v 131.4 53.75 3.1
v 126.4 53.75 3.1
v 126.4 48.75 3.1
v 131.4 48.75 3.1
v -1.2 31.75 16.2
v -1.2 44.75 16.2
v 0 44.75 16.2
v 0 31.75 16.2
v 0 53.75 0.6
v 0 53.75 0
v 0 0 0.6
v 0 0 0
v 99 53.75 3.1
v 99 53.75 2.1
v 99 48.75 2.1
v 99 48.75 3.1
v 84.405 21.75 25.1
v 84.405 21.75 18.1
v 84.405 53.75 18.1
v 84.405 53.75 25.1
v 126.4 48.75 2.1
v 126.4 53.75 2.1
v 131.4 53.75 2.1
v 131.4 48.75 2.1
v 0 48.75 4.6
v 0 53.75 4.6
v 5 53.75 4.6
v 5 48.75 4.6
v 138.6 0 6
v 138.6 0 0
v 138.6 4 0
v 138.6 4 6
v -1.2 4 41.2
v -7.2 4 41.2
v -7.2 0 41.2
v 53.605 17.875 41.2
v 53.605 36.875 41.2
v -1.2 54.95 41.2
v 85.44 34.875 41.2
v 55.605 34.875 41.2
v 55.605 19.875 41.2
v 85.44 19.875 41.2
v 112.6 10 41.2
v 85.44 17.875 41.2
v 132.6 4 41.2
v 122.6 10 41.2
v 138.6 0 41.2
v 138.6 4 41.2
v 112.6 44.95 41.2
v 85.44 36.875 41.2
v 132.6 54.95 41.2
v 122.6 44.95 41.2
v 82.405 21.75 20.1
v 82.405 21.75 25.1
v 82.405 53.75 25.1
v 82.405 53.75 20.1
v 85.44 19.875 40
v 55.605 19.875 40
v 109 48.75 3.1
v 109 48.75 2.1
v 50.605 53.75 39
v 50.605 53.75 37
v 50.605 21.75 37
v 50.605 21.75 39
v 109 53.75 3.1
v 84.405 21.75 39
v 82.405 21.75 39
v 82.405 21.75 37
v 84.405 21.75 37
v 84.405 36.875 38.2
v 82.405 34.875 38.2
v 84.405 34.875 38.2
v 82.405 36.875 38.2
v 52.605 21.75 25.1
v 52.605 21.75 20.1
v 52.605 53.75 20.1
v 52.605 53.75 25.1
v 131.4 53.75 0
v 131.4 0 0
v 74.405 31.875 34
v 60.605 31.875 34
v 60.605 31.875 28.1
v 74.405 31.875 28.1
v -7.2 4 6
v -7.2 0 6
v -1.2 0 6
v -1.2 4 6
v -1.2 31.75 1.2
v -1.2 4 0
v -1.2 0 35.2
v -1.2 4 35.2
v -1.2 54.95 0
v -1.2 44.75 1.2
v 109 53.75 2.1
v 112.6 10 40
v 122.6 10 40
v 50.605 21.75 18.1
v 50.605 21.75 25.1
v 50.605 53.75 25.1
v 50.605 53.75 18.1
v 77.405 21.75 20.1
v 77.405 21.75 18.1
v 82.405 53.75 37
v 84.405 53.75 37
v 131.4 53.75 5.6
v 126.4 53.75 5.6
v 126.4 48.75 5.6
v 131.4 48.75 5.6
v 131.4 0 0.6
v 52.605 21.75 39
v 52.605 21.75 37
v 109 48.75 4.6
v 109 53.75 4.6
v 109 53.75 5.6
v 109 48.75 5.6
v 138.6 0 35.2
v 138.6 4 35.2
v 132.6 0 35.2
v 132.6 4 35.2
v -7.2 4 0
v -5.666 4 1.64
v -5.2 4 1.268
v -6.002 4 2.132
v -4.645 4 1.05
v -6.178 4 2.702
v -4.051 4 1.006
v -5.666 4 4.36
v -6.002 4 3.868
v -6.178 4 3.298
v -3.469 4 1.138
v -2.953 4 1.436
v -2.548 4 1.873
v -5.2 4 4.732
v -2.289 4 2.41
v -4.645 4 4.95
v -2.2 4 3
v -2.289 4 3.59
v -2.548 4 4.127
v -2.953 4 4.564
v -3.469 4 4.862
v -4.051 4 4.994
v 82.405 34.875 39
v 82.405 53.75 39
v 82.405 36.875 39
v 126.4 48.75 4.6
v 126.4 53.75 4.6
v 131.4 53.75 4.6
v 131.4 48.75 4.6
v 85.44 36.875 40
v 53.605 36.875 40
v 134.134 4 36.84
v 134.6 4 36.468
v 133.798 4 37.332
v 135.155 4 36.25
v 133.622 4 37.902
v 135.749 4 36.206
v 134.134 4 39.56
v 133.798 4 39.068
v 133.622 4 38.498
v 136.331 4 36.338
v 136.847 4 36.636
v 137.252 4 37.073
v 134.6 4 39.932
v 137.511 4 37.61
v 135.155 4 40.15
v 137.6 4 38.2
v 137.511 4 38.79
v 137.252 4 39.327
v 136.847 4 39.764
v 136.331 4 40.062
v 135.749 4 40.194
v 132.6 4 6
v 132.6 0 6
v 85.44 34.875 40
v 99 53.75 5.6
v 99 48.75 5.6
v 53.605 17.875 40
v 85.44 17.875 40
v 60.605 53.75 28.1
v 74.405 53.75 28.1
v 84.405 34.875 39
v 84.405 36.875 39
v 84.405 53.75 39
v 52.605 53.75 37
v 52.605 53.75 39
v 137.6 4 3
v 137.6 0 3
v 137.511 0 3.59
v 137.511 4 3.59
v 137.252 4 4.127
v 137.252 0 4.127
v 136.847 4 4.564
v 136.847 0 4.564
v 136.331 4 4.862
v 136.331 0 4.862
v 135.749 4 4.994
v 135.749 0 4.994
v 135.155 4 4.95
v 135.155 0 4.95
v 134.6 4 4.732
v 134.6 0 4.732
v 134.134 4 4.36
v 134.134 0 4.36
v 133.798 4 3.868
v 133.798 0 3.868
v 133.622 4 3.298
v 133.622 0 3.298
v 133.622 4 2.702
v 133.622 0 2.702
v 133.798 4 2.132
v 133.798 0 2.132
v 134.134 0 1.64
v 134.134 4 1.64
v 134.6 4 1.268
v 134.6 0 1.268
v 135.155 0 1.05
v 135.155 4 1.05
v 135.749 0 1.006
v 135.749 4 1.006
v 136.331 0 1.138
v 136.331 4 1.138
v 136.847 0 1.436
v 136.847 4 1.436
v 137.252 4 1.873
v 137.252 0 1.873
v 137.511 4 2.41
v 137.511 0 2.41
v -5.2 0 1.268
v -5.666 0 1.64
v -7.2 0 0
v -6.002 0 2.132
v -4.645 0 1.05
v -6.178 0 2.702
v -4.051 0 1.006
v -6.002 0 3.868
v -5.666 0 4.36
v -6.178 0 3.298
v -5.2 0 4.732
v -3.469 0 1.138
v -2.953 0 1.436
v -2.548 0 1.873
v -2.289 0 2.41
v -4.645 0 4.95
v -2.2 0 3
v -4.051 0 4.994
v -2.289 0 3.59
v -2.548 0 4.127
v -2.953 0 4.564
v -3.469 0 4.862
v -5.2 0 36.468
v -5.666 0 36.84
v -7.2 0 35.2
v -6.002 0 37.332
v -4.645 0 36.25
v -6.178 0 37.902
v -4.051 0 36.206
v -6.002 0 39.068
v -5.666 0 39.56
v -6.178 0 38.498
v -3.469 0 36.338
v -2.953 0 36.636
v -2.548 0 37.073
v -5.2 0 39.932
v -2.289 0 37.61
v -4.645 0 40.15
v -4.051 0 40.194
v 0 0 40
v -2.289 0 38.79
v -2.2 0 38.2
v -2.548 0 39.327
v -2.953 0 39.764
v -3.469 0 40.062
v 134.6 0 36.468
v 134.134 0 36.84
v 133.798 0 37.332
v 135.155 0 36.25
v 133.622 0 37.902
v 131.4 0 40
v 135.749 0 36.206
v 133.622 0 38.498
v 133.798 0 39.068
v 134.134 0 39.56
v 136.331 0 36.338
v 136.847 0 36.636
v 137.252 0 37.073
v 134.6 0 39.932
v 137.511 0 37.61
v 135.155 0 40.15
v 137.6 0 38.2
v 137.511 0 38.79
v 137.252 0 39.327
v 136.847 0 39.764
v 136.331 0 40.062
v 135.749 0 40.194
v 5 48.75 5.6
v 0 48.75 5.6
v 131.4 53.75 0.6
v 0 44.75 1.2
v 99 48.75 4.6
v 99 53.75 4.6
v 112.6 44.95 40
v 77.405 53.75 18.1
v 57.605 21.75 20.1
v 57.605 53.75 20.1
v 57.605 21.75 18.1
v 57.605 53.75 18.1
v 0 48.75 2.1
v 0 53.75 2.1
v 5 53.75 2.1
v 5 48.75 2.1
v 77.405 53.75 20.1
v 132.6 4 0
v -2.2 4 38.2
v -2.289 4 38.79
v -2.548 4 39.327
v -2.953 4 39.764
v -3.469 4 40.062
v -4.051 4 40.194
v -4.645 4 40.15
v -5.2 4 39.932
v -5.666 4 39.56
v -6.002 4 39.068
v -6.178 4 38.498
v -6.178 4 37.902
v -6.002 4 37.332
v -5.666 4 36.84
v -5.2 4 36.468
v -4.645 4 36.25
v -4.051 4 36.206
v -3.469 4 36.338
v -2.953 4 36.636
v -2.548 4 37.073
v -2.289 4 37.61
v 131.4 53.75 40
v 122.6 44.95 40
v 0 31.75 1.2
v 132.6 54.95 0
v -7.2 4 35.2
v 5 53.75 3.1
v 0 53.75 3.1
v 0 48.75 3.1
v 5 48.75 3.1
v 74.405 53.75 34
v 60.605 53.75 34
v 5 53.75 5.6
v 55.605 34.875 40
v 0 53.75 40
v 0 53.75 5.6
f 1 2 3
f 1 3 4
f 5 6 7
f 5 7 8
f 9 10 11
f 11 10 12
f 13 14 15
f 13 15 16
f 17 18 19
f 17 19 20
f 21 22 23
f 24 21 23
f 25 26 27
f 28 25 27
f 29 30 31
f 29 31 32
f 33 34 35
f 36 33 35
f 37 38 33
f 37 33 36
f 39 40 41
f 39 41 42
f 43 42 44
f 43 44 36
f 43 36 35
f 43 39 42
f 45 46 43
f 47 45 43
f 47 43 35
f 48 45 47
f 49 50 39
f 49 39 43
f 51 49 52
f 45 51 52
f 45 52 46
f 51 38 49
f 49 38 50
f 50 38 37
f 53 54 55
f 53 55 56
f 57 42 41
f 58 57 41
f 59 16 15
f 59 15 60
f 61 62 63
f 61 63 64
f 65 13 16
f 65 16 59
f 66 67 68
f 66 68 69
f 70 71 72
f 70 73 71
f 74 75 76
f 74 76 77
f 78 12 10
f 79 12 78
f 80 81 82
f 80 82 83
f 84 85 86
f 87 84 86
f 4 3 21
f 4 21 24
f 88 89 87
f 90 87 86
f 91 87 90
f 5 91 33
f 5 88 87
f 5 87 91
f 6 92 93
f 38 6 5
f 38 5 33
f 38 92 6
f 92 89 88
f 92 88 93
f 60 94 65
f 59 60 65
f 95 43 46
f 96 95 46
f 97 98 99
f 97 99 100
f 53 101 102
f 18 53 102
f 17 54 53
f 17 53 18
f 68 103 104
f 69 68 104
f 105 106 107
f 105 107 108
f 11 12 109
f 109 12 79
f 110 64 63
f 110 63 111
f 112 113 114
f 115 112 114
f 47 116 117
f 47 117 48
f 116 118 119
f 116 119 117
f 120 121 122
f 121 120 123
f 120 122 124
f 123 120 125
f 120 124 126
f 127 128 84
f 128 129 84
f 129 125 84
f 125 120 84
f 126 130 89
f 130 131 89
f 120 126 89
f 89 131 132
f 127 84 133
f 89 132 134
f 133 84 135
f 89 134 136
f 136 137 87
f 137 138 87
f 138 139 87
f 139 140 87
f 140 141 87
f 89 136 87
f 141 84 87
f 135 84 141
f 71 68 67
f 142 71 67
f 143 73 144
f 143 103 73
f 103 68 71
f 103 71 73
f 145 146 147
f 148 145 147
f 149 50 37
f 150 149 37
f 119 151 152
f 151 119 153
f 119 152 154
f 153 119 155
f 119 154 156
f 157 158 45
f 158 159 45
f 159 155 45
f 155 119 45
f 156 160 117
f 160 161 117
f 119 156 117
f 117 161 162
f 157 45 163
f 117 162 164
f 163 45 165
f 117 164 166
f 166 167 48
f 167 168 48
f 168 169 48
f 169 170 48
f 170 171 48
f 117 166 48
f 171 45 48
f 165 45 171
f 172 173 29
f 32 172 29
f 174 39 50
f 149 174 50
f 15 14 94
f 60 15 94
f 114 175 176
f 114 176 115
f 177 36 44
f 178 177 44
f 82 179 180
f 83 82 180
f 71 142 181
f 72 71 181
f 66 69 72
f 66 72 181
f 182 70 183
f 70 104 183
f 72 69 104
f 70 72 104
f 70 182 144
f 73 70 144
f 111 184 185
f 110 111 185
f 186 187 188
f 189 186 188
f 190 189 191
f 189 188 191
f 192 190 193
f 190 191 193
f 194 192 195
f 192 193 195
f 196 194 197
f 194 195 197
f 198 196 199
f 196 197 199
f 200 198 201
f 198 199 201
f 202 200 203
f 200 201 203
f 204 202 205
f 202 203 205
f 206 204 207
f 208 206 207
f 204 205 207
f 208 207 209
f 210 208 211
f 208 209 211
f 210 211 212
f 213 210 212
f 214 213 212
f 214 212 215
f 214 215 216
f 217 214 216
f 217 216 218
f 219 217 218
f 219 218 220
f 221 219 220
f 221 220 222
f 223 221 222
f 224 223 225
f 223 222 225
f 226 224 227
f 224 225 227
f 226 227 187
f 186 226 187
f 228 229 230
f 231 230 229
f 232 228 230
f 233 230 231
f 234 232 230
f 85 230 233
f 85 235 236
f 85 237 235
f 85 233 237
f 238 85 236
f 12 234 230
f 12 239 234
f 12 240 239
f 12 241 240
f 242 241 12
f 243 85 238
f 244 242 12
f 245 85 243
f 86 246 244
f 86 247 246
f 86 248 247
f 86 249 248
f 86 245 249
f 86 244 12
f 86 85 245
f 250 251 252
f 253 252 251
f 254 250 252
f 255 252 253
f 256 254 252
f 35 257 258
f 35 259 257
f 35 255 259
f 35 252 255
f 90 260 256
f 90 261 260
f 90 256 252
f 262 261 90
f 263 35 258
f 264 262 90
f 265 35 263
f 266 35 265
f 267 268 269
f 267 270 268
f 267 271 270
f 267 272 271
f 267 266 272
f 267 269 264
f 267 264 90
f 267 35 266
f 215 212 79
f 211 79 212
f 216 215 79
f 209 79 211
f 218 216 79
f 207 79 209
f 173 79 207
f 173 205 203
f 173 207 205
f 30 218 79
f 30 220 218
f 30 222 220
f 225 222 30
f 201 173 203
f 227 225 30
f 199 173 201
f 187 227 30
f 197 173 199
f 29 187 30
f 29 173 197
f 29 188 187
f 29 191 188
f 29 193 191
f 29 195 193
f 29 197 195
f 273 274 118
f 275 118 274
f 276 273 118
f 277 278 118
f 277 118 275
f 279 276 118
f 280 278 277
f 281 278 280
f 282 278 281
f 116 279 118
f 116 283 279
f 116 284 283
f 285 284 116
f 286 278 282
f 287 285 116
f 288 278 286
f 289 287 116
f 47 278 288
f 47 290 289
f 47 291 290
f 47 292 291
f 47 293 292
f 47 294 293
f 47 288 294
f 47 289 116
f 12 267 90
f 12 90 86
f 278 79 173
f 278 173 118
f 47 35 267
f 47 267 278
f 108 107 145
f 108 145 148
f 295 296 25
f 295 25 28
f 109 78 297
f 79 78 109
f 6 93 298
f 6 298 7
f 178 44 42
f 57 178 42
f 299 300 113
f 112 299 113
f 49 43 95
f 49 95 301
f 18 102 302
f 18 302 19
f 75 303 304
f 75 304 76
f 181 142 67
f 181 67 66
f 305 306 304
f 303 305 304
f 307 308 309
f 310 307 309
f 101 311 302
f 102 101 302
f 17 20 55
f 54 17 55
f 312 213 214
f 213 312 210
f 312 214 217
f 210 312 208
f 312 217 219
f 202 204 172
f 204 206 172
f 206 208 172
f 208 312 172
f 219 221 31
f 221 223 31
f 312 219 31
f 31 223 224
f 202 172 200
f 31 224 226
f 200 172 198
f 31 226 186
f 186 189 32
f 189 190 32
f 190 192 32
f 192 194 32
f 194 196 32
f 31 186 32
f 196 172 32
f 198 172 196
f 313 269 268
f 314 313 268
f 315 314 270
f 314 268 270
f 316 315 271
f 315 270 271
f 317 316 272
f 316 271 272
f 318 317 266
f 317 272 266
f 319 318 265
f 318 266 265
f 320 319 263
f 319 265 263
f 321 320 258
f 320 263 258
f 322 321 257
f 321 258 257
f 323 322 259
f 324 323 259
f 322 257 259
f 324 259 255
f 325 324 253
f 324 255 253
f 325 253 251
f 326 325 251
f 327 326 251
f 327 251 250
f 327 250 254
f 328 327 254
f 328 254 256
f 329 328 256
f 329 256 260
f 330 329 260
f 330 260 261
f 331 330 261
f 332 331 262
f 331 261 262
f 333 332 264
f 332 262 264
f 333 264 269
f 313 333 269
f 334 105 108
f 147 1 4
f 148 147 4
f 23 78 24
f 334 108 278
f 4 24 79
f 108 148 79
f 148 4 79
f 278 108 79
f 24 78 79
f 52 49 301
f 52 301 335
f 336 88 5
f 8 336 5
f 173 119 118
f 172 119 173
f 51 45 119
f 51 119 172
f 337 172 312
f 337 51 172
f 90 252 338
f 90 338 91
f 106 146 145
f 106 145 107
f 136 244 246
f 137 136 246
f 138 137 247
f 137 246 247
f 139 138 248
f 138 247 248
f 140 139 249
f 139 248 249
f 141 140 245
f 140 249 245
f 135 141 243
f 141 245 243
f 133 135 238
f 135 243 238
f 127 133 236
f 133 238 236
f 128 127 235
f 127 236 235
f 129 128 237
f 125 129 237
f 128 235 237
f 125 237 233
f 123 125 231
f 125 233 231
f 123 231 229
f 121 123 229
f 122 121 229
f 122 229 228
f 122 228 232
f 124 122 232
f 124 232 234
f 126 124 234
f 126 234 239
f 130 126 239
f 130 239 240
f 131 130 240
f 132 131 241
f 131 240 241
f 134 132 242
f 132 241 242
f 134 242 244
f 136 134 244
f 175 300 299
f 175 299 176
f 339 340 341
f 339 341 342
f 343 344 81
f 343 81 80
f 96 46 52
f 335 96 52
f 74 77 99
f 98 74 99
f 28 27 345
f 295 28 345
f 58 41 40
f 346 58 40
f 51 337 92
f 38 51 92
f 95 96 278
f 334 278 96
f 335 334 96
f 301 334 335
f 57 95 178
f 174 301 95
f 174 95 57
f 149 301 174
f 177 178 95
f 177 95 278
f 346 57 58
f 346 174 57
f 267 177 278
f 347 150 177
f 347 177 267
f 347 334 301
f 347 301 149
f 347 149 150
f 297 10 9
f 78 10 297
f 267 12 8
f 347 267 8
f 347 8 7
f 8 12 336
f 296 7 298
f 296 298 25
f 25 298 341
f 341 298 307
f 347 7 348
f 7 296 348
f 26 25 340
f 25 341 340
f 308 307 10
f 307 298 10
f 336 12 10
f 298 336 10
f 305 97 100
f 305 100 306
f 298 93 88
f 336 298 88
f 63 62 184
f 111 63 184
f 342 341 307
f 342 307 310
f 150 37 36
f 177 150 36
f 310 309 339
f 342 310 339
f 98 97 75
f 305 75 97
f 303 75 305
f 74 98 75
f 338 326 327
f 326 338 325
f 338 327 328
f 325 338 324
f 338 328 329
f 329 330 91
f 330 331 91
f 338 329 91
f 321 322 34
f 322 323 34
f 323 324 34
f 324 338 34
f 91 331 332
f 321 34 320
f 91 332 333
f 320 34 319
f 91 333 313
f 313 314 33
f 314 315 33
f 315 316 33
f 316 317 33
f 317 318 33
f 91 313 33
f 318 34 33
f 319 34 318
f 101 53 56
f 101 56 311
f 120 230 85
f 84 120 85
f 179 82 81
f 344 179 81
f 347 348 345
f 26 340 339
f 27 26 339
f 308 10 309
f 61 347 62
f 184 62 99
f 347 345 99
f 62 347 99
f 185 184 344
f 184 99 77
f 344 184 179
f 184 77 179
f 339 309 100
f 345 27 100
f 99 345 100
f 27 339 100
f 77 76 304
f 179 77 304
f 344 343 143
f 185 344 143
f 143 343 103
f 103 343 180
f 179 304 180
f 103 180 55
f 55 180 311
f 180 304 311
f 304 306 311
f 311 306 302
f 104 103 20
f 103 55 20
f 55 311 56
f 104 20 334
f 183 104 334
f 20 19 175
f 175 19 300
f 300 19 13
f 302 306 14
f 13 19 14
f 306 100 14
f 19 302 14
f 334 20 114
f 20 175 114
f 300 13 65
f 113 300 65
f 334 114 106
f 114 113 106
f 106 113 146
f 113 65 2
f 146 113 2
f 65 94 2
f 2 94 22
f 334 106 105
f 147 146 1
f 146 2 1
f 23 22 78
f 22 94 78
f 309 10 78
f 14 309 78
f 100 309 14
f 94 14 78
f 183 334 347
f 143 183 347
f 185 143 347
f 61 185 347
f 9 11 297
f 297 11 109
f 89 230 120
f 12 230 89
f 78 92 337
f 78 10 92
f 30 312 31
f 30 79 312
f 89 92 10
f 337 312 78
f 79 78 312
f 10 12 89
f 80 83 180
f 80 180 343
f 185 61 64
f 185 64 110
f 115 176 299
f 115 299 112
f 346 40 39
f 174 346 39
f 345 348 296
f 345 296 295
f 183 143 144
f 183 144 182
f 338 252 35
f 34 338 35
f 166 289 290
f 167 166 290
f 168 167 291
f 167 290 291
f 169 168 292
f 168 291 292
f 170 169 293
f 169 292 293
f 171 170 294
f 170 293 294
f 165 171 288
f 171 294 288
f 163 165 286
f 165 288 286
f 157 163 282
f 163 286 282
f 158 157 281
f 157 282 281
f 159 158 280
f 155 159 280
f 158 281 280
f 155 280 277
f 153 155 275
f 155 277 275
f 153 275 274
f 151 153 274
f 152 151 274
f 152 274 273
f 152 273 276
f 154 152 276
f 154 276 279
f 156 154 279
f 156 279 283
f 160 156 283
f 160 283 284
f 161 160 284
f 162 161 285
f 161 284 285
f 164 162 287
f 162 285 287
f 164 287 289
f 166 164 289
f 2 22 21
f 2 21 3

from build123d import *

# Parameters (mm, degrees)
F1_DEPTH  = 40
F2_W      = 131.4
F2_H      = 53.75
F3_DEPTH  = 0.6
F4_W      = 5
F4_H      = 1
F4_W_2    = 10
F5_DEPTH  = 5
F6_W      = 2
F6_H      = 2
F7_DEPTH  = 32
F8_W      = 13.8
F8_H      = 5.9
F9_DEPTH  = 21.875
F11_DEPTH = 54.95
F12_W     = 10
F12_H     = 34.95
F13_DEPTH = 3
F14_W     = 13
F14_H     = 15
F15_DEPTH = 25
F16_W     = 6
F16_H     = 6
F16_R     = 2
F17_DEPTH = 4


with BuildPart() as f1:
    # F0 (on Top) → F1 (new body)
    with BuildSketch(Plane.XY):
        Polygon((0, 0), (0, 53.75), (131.4, 53.75), (131.4, 0), (132.6, 0), (132.6, 53.75), (132.6, 54.95), (0, 54.95), (-1.2, 54.95), (-1.2, 0), align=None)
    extrude(amount=F1_DEPTH)

    # F4 (on face) → F5 (join)
    with BuildSketch(Plane.XZ.offset(-53.75)):
        with Locations((2.5, 2.6)):
            Rectangle(F4_W, F4_H)
        with Locations((2.5, 5.1)):
            Rectangle(F4_W, F4_H)
        with Locations((128.9, 2.6)):
            Rectangle(F4_W, F4_H)
        with Locations((128.9, 5.1)):
            Rectangle(F4_W, F4_H)
        with Locations((104, 2.6)):
            Rectangle(F4_W_2, F4_H)
        with Locations((104, 5.1)):
            Rectangle(F4_W_2, F4_H)
    extrude(amount=F5_DEPTH)

    # F6 (on face) → F7 (join)
    with BuildSketch(Plane.XZ.offset(-53.75)):
        Polygon((57.60504, 20.1), (52.60504, 20.1), (52.60504, 25.1), (50.60504, 25.1), (50.60504, 18.1), (57.60504, 18.1), align=None)
        Polygon((82.40504, 20.1), (77.40504, 20.1), (77.40504, 18.1), (84.40504, 18.1), (84.40504, 25.1), (82.40504, 25.1), align=None)
        with Locations((83.40504, 38)):
            Rectangle(F6_W, F6_H)
        with Locations((51.60504, 38)):
            Rectangle(F6_W, F6_H)
    extrude(amount=F7_DEPTH)

    # F8 (on face) → F9 (join)
    with BuildSketch(Plane.XZ.offset(-53.75)):
        with Locations((67.50504, 31.05)):
            Rectangle(F8_W, F8_H)
    extrude(amount=F9_DEPTH)

    # F10 (on face) → F11 (join, through all)
    with BuildSketch(Plane(origin=(0, 54.95, 0), x_dir=(-1, 0, 0), z_dir=(0, 1, 0))):
        Polygon((-132.6, 40), (-131.4, 40), (-127.4, 40), (1.2, 40), (1.2, 41.2), (-127.4, 41.2), (-132.6, 41.2), align=None)
    extrude(amount=-F11_DEPTH)

    # F12 (on face) → F13 (cut)
    with BuildSketch(Plane.XY.offset(41.2)):
        Polygon((85.440105, 34.875), (85.440105, 36.875), (53.60504, 36.875), (53.60504, 17.875), (85.440105, 17.875), (85.440105, 19.875), (55.60504, 19.875), (55.60504, 34.875), align=None)
        with Locations((117.6, 27.475)):
            Rectangle(F12_W, F12_H)
    extrude(amount=-F13_DEPTH, mode=Mode.SUBTRACT)

    # F14 (on face) → F15 (cut)
    with BuildSketch(Plane(origin=(-1.2, 0, 0), x_dir=(0, -1, 0), z_dir=(-1, 0, 0))):
        with Locations((-38.25, 8.7)):
            Rectangle(F14_W, F14_H)
    extrude(amount=-F15_DEPTH, mode=Mode.SUBTRACT)

    # F16 (on face) → F17 (join)
    with BuildSketch(Plane.XZ):
        with Locations((-4.2, 3)):
            Rectangle(F16_W, F16_H)
        with Locations((-4.2, 3)):
            Circle(F16_R, mode=Mode.SUBTRACT)
        with Locations((-4.2, 38.2)):
            Rectangle(F16_W, F16_H)
        with Locations((-4.2, 38.2)):
            Circle(F16_R, mode=Mode.SUBTRACT)
        with Locations((135.6, 38.2)):
            Rectangle(F16_W, F16_H)
        with Locations((135.6, 38.2)):
            Circle(F16_R, mode=Mode.SUBTRACT)
        with Locations((135.6, 3)):
            Rectangle(F16_W, F16_H)
        with Locations((135.6, 3)):
            Circle(F16_R, mode=Mode.SUBTRACT)
    extrude(amount=-F17_DEPTH)


with BuildPart() as f3:
    # F2 (on face) → F3 (new body)
    with BuildSketch(Plane(origin=(0, 0, 0), x_dir=(1, 0, 0), z_dir=(0, 0, -1))):
        with Locations((65.7, -26.875)):
            Rectangle(F2_W, F2_H)
    extrude(amount=-F3_DEPTH)


solid = Compound([f1.part, f3.part])
